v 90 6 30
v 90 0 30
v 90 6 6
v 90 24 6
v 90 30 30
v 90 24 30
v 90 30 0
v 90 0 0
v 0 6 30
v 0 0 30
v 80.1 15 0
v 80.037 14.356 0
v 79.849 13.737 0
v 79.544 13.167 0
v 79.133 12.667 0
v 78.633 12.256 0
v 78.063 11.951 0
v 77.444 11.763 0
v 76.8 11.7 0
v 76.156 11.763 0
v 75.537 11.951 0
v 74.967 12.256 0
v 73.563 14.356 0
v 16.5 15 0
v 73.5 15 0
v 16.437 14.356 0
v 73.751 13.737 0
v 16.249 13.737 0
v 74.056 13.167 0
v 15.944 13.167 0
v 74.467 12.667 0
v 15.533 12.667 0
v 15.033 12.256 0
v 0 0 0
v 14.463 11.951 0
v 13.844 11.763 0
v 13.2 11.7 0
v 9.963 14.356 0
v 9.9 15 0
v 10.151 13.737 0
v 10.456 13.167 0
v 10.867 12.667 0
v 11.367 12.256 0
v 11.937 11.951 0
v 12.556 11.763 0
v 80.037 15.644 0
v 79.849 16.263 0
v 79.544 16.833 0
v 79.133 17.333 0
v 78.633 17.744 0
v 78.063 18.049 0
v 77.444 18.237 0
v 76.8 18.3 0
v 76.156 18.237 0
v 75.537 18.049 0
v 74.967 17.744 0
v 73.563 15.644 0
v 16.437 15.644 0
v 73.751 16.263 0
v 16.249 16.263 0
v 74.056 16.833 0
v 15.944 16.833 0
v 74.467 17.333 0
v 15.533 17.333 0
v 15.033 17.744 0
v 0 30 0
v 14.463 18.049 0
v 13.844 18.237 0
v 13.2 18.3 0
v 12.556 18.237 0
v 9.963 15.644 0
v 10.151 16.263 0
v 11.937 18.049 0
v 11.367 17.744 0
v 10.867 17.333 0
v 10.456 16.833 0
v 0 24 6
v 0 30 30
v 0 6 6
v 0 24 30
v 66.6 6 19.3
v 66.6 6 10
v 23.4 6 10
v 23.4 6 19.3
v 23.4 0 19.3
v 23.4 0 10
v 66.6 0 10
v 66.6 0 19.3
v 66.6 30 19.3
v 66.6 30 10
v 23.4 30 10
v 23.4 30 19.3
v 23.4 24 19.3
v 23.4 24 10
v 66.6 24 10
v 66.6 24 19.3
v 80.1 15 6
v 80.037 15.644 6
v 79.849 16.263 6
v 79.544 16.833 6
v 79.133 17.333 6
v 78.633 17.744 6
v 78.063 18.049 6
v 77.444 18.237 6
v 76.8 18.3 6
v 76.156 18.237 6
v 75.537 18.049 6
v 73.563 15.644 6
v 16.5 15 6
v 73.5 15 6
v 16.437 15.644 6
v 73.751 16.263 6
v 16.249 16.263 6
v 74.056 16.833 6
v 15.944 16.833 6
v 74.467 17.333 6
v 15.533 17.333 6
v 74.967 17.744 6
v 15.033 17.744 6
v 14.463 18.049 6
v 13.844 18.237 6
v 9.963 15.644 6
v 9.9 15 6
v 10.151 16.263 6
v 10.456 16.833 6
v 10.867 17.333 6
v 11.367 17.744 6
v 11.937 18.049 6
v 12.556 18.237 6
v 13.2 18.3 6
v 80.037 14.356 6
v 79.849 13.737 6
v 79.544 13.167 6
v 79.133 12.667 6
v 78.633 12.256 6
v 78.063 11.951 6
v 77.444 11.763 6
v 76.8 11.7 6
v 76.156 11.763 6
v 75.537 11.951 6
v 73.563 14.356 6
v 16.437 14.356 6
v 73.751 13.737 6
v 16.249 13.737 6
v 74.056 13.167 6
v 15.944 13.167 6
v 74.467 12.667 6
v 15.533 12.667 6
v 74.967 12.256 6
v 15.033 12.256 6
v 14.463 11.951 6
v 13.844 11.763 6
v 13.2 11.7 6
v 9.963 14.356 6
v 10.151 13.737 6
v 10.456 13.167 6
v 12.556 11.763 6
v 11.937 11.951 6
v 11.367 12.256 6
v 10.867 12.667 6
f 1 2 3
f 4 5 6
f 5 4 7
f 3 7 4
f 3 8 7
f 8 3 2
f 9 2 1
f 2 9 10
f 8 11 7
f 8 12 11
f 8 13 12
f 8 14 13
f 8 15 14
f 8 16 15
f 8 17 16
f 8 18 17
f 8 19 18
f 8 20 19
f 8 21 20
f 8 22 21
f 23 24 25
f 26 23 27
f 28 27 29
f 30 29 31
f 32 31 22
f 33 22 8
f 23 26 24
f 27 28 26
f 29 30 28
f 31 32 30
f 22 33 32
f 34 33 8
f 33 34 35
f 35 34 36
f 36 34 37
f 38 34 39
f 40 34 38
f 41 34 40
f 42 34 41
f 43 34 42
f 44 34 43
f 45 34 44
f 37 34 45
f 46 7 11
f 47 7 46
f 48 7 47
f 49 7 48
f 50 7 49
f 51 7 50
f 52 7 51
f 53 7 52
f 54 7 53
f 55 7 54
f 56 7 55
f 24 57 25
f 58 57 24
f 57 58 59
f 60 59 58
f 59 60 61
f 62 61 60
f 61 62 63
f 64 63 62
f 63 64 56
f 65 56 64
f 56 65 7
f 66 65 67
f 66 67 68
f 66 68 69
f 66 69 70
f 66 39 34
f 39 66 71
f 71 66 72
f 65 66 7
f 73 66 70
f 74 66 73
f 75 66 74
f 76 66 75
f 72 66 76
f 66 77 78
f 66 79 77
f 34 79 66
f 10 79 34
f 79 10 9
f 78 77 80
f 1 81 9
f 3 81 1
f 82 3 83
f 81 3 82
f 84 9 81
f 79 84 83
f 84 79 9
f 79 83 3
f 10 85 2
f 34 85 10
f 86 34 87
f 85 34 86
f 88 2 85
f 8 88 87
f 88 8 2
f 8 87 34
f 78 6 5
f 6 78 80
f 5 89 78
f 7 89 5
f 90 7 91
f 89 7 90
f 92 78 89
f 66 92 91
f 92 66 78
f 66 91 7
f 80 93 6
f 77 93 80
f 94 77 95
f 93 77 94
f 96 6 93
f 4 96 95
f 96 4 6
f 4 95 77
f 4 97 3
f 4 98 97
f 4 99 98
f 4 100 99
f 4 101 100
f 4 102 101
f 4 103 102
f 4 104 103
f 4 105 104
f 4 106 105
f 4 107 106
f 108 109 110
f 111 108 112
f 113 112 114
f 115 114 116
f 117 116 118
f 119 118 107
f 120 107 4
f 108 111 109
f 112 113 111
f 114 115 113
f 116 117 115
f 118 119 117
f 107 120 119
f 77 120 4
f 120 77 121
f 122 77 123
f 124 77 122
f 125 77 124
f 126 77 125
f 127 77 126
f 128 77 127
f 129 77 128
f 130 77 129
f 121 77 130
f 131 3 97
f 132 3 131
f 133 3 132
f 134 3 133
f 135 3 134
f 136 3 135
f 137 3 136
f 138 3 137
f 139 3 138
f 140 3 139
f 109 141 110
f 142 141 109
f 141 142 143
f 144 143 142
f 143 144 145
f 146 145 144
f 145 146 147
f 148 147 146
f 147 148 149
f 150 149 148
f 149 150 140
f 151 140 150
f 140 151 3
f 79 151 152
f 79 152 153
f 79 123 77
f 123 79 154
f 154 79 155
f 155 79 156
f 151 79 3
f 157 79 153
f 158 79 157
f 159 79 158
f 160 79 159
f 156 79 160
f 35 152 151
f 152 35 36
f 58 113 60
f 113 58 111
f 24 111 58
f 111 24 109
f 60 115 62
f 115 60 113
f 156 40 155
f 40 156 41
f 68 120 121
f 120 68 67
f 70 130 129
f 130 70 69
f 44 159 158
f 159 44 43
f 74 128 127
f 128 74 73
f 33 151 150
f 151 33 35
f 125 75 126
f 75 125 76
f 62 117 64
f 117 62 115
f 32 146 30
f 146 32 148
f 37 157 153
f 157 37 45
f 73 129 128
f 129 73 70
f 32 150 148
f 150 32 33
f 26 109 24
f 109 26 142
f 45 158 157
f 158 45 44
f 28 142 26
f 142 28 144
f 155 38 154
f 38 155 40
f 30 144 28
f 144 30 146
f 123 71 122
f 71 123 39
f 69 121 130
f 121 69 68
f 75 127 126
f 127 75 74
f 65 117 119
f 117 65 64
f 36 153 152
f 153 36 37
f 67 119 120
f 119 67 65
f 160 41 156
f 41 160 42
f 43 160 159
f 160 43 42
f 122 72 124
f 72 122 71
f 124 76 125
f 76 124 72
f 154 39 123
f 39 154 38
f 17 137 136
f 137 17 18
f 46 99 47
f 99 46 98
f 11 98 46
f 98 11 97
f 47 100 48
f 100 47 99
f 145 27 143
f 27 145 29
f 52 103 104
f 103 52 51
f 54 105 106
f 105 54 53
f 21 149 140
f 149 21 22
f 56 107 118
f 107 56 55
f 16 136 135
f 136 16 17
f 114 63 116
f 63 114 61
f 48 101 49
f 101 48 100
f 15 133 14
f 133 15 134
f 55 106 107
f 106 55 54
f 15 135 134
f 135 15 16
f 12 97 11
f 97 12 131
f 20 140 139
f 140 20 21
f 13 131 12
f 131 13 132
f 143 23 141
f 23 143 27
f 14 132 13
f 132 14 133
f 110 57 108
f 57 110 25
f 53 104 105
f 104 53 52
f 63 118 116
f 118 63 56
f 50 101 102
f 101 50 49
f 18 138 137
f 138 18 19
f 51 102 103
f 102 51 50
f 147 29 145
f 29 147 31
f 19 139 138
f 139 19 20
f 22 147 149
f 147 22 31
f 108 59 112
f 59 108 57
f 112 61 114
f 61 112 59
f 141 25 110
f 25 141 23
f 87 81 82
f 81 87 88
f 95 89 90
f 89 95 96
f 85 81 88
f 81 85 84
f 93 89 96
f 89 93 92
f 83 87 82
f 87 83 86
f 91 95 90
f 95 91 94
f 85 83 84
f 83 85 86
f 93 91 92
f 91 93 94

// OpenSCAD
$fn = 32;

// ----------------------------------------------------------------------
// U-bracket: 90 x 30 x 30 mm
// ----------------------------------------------------------------------

// --- parameters (mm) ---
rail_len = 90;            // outer length, X
jaw_w = 30;               // outer width, Y
jaw_h = 30;               // upright height, Z
web_t = 6;                // wall thickness
hole_d = 6.6;             // clearance for M6
window_l = 43.2;          // window length
window_h = 9.3;           // window height

module hole_z(px, py) {
  translate([px, py, -0.5]) cylinder(h = web_t + 1, d = hole_d);
}
module hole_y_pz(pz) {
  /* through both uprights along Y */
  translate([0, -0.5, pz]) rotate([-90, 0, 0]) cylinder(h = jaw_w + 1, d = hole_d);
}

module base() {
  cube([rail_len, jaw_w, web_t]);
}

module uprights() {
  cube([rail_len, web_t, jaw_h]);
  translate([0, jaw_w - web_t, 0]) cube([rail_len, web_t, jaw_h]);
}

difference() {
  union() {
    base();
    uprights();
  }
  hole_z(13.2, 15);
  hole_z(76.8, 15);
  /* lightening window through both uprights */
  translate([rail_len / 2 - window_l / 2, -1, web_t + 4])
    cube([window_l, jaw_w + 2, window_h]);
}
